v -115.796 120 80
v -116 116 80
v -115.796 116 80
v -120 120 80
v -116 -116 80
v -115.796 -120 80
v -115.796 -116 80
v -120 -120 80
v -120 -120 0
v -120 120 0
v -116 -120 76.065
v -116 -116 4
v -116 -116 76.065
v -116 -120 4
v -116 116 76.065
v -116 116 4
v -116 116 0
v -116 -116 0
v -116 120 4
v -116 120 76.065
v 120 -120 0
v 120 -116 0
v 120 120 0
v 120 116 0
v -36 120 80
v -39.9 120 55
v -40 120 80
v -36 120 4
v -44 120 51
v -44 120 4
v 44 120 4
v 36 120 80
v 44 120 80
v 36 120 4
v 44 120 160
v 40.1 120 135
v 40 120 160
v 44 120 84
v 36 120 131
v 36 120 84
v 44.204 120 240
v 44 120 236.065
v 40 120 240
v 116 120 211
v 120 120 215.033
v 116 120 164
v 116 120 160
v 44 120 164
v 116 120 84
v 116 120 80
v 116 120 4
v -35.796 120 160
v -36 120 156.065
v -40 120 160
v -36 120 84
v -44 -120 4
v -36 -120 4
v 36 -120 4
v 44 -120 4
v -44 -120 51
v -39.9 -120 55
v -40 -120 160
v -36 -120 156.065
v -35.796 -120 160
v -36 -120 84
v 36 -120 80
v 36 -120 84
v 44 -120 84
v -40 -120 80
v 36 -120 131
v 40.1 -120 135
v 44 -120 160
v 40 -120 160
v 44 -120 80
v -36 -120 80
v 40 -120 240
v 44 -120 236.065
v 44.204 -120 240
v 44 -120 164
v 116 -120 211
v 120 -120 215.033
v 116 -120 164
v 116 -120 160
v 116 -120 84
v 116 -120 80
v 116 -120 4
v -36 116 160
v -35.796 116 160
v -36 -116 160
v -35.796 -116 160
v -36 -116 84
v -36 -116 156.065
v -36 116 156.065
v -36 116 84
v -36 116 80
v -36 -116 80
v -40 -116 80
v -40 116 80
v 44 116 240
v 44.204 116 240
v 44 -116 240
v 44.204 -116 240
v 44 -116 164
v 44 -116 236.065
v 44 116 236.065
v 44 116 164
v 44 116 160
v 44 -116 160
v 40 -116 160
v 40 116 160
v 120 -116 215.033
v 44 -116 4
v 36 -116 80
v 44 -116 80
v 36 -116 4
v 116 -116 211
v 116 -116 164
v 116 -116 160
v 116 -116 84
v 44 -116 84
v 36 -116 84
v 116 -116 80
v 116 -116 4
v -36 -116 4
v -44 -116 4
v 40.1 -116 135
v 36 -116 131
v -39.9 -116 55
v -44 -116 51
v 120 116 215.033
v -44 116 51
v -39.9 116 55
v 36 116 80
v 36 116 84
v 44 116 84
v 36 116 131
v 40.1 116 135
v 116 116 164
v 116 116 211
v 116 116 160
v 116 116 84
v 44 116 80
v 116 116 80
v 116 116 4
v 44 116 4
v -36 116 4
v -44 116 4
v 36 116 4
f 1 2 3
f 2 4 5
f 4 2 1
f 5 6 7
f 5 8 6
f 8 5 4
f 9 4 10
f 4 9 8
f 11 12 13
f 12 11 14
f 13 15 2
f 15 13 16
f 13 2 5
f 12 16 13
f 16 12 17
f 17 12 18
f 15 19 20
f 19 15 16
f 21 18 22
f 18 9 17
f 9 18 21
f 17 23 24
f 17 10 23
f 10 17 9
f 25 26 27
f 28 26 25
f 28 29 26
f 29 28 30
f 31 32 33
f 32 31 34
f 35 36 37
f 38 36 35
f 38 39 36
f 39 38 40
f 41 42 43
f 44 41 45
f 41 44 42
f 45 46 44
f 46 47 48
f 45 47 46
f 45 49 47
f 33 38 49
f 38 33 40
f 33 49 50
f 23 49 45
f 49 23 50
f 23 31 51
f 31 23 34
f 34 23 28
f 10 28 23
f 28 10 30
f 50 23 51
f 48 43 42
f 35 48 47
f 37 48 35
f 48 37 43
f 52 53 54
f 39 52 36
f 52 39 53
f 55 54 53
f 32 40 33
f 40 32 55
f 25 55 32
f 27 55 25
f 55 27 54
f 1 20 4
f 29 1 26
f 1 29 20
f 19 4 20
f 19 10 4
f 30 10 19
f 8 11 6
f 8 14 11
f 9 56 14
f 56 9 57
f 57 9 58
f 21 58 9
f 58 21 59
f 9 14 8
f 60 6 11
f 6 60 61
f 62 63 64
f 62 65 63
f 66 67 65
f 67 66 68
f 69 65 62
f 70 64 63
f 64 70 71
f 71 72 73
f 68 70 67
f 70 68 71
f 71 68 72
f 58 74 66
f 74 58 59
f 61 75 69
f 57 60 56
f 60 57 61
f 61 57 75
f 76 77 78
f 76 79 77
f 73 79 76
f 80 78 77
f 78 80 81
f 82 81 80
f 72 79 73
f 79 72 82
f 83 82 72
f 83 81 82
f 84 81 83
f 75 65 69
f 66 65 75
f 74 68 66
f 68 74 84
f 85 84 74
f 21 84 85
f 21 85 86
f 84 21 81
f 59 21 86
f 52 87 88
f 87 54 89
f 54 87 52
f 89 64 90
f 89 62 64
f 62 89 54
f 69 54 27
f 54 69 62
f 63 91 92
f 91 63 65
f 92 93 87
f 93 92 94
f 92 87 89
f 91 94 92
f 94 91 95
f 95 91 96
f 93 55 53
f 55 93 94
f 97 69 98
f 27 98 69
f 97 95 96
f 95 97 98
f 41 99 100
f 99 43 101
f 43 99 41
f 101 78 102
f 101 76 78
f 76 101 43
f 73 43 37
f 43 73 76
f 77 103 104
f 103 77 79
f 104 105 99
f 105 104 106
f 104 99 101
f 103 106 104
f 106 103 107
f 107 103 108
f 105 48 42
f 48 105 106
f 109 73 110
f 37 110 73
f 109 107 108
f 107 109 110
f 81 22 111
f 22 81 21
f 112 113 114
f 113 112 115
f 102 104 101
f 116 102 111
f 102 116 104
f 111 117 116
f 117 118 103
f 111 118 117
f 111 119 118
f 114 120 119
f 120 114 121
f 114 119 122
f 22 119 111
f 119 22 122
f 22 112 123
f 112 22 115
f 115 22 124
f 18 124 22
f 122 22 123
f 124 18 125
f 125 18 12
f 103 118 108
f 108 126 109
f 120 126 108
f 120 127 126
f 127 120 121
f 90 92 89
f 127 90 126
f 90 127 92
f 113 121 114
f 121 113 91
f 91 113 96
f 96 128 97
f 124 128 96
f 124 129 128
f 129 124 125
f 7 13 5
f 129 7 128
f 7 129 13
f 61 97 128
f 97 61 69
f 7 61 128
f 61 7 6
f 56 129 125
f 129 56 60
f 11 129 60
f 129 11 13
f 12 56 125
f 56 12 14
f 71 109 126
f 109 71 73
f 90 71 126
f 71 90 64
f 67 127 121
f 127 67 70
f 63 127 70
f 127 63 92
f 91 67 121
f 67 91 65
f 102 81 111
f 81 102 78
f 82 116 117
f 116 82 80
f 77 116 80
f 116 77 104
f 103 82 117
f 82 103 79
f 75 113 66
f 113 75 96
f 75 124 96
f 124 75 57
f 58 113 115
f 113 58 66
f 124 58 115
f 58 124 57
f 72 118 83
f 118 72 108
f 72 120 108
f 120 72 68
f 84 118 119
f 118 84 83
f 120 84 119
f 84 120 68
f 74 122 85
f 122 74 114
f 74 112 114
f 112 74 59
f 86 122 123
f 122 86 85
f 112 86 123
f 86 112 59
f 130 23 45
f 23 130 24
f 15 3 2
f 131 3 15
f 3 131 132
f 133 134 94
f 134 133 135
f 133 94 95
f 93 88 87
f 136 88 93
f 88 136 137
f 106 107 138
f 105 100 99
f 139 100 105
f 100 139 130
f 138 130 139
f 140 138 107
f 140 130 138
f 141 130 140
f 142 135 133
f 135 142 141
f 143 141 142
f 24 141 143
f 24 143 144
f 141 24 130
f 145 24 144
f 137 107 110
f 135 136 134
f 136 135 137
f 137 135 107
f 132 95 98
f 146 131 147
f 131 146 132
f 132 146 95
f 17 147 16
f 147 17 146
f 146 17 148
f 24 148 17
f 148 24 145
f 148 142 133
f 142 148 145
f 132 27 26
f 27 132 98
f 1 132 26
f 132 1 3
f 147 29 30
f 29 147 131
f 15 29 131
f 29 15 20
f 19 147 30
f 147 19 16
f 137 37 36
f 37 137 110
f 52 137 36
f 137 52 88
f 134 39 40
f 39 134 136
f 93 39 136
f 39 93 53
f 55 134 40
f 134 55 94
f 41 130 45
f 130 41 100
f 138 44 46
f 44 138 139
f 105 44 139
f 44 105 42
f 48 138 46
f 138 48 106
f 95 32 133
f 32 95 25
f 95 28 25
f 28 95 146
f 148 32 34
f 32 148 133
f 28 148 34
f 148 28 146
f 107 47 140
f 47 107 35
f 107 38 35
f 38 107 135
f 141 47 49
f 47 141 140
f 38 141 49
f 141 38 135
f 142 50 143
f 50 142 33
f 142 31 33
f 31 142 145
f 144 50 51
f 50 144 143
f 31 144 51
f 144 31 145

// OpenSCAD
// Tiered 3 level display for Funkos

eps = 0.1;

shelf_d = 80;
shelf_w = 240;
shelf_h = 4;
shelf_h_sep = 80;

wall_d = shelf_d;
wall_w = 4;
wall_cut = 25;

module shelf()
{
	st_l = shelf_d;
	st_w = shelf_w;
	st_h = shelf_h;

	cube([st_l, st_w, st_h], center=true);
}

module wall(wall_h)
{
	wall_l = wall_d;

	top_x = wall_l / 2 + eps;
	top_y = wall_h / 2 - shelf_h + eps;

	difference() {
		cube([wall_l, wall_w, wall_h], center=true);

		rotate([90, 0, 0])
			linear_extrude(
				height = wall_w + 2 * eps,
				center = true
			)
				polygon(points = [
					[top_x, top_y],
					[wall_l / 2 - wall_cut, wall_h / 2 - shelf_h_sep - eps],
					[top_x, wall_h / 2 - shelf_h_sep]
				]);

		rotate([90, 0, 0])
			linear_extrude(
				height = wall_w + 2 * eps,
				center = true
			)
				polygon(points = [
					[top_x - shelf_h, top_y],
					[- wall_l / 2 + shelf_h, top_y],
					[- wall_l / 2 + shelf_h, wall_h / 2 - shelf_h_sep + shelf_h],
                    [wall_l / 2 - wall_cut - wall_w, wall_h / 2 - shelf_h_sep + shelf_h]
				]);
	}
}

module shelves()
{
	s1_off_l = (shelf_d / 2);
	s1_off_w = (shelf_w / 2);
	s1_off_h = -(shelf_h / 2) + (shelf_h_sep * 3);

	s2_off_l = (shelf_d / 2) + shelf_d;
	s2_off_w = (shelf_w / 2);
	s2_off_h = -(shelf_h / 2) + (shelf_h_sep * 2);

	s3_off_l = (shelf_d / 2) + (shelf_d * 2);
	s3_off_w = (shelf_w / 2);
	s3_off_h = -(shelf_h / 2) + shelf_h_sep;

	union()
	{
		translate([s1_off_l, s1_off_w, s1_off_h])
			shelf();
		translate([s2_off_l, s2_off_w, s2_off_h])
			shelf();
		translate([s3_off_l, s3_off_w, s3_off_h])
			shelf();
	}
}

module wall_hole()
{
    hole_l = shelf_d - wall_w;
    hole_w = wall_w + eps * 2;
    hole_h = shelf_d - wall_w * 2;

    cube([hole_l, hole_w, hole_h]);
}

module wall_comb()
{
	w1_h = 240;
	w2_h = w1_h - shelf_h_sep;
	w3_h = w2_h - shelf_h_sep;

	w1_off_l = (wall_d / 2);
	w1_off_w = 0;
	w1_off_h = (w1_h / 2);

	w2_off_l = shelf_d + (wall_d / 2);
	w2_off_w = 0;
	w2_off_h = (w2_h / 2);

	w3_off_l = (shelf_d * 2) + (wall_d / 2);
	w3_off_w = 0;
	w3_off_h = (w3_h / 2);

	d1_off_l = wall_w;
	d1_off_w = -(wall_w / 2) - eps;
	d1_off_h = wall_w + (w1_h / 2) - (shelf_d / 2);

	d2_off_l = shelf_h_sep + wall_w;
	d2_off_w = -(wall_w / 2) - eps;
	d2_off_h = wall_w;

	d3_off_l = wall_w;
	d3_off_w = -(wall_w / 2) - eps;
	d3_off_h = wall_w;

    difference() {
        union()
        {
            translate([w1_off_l, w1_off_w, w1_off_h])
                wall(w1_h);
            translate([w2_off_l, w2_off_w, w2_off_h])
                wall(w2_h);
            translate([w3_off_l, w3_off_w, w3_off_h])
                wall(w3_h);
        }

        translate([d1_off_l, d1_off_w, d1_off_h])
            wall_hole();
        translate([d2_off_l, d2_off_w, d2_off_h])
            wall_hole();
        translate([d3_off_l, d3_off_w, d3_off_h])
            wall_hole();
    }
}

module walls()
{
	union()
	{
		translate([0,(wall_w / 2), 0])
			wall_comb();
		translate([0, shelf_w - (wall_w / 2), 0])
			wall_comb();
	}
}

module funko_display()
{
    translate([shelf_d * 3 / 2, -shelf_w / 2, 0])
        rotate([0, -90, 0])
            union()
            {
                shelves();
                walls();
            }
}

funko_display();
